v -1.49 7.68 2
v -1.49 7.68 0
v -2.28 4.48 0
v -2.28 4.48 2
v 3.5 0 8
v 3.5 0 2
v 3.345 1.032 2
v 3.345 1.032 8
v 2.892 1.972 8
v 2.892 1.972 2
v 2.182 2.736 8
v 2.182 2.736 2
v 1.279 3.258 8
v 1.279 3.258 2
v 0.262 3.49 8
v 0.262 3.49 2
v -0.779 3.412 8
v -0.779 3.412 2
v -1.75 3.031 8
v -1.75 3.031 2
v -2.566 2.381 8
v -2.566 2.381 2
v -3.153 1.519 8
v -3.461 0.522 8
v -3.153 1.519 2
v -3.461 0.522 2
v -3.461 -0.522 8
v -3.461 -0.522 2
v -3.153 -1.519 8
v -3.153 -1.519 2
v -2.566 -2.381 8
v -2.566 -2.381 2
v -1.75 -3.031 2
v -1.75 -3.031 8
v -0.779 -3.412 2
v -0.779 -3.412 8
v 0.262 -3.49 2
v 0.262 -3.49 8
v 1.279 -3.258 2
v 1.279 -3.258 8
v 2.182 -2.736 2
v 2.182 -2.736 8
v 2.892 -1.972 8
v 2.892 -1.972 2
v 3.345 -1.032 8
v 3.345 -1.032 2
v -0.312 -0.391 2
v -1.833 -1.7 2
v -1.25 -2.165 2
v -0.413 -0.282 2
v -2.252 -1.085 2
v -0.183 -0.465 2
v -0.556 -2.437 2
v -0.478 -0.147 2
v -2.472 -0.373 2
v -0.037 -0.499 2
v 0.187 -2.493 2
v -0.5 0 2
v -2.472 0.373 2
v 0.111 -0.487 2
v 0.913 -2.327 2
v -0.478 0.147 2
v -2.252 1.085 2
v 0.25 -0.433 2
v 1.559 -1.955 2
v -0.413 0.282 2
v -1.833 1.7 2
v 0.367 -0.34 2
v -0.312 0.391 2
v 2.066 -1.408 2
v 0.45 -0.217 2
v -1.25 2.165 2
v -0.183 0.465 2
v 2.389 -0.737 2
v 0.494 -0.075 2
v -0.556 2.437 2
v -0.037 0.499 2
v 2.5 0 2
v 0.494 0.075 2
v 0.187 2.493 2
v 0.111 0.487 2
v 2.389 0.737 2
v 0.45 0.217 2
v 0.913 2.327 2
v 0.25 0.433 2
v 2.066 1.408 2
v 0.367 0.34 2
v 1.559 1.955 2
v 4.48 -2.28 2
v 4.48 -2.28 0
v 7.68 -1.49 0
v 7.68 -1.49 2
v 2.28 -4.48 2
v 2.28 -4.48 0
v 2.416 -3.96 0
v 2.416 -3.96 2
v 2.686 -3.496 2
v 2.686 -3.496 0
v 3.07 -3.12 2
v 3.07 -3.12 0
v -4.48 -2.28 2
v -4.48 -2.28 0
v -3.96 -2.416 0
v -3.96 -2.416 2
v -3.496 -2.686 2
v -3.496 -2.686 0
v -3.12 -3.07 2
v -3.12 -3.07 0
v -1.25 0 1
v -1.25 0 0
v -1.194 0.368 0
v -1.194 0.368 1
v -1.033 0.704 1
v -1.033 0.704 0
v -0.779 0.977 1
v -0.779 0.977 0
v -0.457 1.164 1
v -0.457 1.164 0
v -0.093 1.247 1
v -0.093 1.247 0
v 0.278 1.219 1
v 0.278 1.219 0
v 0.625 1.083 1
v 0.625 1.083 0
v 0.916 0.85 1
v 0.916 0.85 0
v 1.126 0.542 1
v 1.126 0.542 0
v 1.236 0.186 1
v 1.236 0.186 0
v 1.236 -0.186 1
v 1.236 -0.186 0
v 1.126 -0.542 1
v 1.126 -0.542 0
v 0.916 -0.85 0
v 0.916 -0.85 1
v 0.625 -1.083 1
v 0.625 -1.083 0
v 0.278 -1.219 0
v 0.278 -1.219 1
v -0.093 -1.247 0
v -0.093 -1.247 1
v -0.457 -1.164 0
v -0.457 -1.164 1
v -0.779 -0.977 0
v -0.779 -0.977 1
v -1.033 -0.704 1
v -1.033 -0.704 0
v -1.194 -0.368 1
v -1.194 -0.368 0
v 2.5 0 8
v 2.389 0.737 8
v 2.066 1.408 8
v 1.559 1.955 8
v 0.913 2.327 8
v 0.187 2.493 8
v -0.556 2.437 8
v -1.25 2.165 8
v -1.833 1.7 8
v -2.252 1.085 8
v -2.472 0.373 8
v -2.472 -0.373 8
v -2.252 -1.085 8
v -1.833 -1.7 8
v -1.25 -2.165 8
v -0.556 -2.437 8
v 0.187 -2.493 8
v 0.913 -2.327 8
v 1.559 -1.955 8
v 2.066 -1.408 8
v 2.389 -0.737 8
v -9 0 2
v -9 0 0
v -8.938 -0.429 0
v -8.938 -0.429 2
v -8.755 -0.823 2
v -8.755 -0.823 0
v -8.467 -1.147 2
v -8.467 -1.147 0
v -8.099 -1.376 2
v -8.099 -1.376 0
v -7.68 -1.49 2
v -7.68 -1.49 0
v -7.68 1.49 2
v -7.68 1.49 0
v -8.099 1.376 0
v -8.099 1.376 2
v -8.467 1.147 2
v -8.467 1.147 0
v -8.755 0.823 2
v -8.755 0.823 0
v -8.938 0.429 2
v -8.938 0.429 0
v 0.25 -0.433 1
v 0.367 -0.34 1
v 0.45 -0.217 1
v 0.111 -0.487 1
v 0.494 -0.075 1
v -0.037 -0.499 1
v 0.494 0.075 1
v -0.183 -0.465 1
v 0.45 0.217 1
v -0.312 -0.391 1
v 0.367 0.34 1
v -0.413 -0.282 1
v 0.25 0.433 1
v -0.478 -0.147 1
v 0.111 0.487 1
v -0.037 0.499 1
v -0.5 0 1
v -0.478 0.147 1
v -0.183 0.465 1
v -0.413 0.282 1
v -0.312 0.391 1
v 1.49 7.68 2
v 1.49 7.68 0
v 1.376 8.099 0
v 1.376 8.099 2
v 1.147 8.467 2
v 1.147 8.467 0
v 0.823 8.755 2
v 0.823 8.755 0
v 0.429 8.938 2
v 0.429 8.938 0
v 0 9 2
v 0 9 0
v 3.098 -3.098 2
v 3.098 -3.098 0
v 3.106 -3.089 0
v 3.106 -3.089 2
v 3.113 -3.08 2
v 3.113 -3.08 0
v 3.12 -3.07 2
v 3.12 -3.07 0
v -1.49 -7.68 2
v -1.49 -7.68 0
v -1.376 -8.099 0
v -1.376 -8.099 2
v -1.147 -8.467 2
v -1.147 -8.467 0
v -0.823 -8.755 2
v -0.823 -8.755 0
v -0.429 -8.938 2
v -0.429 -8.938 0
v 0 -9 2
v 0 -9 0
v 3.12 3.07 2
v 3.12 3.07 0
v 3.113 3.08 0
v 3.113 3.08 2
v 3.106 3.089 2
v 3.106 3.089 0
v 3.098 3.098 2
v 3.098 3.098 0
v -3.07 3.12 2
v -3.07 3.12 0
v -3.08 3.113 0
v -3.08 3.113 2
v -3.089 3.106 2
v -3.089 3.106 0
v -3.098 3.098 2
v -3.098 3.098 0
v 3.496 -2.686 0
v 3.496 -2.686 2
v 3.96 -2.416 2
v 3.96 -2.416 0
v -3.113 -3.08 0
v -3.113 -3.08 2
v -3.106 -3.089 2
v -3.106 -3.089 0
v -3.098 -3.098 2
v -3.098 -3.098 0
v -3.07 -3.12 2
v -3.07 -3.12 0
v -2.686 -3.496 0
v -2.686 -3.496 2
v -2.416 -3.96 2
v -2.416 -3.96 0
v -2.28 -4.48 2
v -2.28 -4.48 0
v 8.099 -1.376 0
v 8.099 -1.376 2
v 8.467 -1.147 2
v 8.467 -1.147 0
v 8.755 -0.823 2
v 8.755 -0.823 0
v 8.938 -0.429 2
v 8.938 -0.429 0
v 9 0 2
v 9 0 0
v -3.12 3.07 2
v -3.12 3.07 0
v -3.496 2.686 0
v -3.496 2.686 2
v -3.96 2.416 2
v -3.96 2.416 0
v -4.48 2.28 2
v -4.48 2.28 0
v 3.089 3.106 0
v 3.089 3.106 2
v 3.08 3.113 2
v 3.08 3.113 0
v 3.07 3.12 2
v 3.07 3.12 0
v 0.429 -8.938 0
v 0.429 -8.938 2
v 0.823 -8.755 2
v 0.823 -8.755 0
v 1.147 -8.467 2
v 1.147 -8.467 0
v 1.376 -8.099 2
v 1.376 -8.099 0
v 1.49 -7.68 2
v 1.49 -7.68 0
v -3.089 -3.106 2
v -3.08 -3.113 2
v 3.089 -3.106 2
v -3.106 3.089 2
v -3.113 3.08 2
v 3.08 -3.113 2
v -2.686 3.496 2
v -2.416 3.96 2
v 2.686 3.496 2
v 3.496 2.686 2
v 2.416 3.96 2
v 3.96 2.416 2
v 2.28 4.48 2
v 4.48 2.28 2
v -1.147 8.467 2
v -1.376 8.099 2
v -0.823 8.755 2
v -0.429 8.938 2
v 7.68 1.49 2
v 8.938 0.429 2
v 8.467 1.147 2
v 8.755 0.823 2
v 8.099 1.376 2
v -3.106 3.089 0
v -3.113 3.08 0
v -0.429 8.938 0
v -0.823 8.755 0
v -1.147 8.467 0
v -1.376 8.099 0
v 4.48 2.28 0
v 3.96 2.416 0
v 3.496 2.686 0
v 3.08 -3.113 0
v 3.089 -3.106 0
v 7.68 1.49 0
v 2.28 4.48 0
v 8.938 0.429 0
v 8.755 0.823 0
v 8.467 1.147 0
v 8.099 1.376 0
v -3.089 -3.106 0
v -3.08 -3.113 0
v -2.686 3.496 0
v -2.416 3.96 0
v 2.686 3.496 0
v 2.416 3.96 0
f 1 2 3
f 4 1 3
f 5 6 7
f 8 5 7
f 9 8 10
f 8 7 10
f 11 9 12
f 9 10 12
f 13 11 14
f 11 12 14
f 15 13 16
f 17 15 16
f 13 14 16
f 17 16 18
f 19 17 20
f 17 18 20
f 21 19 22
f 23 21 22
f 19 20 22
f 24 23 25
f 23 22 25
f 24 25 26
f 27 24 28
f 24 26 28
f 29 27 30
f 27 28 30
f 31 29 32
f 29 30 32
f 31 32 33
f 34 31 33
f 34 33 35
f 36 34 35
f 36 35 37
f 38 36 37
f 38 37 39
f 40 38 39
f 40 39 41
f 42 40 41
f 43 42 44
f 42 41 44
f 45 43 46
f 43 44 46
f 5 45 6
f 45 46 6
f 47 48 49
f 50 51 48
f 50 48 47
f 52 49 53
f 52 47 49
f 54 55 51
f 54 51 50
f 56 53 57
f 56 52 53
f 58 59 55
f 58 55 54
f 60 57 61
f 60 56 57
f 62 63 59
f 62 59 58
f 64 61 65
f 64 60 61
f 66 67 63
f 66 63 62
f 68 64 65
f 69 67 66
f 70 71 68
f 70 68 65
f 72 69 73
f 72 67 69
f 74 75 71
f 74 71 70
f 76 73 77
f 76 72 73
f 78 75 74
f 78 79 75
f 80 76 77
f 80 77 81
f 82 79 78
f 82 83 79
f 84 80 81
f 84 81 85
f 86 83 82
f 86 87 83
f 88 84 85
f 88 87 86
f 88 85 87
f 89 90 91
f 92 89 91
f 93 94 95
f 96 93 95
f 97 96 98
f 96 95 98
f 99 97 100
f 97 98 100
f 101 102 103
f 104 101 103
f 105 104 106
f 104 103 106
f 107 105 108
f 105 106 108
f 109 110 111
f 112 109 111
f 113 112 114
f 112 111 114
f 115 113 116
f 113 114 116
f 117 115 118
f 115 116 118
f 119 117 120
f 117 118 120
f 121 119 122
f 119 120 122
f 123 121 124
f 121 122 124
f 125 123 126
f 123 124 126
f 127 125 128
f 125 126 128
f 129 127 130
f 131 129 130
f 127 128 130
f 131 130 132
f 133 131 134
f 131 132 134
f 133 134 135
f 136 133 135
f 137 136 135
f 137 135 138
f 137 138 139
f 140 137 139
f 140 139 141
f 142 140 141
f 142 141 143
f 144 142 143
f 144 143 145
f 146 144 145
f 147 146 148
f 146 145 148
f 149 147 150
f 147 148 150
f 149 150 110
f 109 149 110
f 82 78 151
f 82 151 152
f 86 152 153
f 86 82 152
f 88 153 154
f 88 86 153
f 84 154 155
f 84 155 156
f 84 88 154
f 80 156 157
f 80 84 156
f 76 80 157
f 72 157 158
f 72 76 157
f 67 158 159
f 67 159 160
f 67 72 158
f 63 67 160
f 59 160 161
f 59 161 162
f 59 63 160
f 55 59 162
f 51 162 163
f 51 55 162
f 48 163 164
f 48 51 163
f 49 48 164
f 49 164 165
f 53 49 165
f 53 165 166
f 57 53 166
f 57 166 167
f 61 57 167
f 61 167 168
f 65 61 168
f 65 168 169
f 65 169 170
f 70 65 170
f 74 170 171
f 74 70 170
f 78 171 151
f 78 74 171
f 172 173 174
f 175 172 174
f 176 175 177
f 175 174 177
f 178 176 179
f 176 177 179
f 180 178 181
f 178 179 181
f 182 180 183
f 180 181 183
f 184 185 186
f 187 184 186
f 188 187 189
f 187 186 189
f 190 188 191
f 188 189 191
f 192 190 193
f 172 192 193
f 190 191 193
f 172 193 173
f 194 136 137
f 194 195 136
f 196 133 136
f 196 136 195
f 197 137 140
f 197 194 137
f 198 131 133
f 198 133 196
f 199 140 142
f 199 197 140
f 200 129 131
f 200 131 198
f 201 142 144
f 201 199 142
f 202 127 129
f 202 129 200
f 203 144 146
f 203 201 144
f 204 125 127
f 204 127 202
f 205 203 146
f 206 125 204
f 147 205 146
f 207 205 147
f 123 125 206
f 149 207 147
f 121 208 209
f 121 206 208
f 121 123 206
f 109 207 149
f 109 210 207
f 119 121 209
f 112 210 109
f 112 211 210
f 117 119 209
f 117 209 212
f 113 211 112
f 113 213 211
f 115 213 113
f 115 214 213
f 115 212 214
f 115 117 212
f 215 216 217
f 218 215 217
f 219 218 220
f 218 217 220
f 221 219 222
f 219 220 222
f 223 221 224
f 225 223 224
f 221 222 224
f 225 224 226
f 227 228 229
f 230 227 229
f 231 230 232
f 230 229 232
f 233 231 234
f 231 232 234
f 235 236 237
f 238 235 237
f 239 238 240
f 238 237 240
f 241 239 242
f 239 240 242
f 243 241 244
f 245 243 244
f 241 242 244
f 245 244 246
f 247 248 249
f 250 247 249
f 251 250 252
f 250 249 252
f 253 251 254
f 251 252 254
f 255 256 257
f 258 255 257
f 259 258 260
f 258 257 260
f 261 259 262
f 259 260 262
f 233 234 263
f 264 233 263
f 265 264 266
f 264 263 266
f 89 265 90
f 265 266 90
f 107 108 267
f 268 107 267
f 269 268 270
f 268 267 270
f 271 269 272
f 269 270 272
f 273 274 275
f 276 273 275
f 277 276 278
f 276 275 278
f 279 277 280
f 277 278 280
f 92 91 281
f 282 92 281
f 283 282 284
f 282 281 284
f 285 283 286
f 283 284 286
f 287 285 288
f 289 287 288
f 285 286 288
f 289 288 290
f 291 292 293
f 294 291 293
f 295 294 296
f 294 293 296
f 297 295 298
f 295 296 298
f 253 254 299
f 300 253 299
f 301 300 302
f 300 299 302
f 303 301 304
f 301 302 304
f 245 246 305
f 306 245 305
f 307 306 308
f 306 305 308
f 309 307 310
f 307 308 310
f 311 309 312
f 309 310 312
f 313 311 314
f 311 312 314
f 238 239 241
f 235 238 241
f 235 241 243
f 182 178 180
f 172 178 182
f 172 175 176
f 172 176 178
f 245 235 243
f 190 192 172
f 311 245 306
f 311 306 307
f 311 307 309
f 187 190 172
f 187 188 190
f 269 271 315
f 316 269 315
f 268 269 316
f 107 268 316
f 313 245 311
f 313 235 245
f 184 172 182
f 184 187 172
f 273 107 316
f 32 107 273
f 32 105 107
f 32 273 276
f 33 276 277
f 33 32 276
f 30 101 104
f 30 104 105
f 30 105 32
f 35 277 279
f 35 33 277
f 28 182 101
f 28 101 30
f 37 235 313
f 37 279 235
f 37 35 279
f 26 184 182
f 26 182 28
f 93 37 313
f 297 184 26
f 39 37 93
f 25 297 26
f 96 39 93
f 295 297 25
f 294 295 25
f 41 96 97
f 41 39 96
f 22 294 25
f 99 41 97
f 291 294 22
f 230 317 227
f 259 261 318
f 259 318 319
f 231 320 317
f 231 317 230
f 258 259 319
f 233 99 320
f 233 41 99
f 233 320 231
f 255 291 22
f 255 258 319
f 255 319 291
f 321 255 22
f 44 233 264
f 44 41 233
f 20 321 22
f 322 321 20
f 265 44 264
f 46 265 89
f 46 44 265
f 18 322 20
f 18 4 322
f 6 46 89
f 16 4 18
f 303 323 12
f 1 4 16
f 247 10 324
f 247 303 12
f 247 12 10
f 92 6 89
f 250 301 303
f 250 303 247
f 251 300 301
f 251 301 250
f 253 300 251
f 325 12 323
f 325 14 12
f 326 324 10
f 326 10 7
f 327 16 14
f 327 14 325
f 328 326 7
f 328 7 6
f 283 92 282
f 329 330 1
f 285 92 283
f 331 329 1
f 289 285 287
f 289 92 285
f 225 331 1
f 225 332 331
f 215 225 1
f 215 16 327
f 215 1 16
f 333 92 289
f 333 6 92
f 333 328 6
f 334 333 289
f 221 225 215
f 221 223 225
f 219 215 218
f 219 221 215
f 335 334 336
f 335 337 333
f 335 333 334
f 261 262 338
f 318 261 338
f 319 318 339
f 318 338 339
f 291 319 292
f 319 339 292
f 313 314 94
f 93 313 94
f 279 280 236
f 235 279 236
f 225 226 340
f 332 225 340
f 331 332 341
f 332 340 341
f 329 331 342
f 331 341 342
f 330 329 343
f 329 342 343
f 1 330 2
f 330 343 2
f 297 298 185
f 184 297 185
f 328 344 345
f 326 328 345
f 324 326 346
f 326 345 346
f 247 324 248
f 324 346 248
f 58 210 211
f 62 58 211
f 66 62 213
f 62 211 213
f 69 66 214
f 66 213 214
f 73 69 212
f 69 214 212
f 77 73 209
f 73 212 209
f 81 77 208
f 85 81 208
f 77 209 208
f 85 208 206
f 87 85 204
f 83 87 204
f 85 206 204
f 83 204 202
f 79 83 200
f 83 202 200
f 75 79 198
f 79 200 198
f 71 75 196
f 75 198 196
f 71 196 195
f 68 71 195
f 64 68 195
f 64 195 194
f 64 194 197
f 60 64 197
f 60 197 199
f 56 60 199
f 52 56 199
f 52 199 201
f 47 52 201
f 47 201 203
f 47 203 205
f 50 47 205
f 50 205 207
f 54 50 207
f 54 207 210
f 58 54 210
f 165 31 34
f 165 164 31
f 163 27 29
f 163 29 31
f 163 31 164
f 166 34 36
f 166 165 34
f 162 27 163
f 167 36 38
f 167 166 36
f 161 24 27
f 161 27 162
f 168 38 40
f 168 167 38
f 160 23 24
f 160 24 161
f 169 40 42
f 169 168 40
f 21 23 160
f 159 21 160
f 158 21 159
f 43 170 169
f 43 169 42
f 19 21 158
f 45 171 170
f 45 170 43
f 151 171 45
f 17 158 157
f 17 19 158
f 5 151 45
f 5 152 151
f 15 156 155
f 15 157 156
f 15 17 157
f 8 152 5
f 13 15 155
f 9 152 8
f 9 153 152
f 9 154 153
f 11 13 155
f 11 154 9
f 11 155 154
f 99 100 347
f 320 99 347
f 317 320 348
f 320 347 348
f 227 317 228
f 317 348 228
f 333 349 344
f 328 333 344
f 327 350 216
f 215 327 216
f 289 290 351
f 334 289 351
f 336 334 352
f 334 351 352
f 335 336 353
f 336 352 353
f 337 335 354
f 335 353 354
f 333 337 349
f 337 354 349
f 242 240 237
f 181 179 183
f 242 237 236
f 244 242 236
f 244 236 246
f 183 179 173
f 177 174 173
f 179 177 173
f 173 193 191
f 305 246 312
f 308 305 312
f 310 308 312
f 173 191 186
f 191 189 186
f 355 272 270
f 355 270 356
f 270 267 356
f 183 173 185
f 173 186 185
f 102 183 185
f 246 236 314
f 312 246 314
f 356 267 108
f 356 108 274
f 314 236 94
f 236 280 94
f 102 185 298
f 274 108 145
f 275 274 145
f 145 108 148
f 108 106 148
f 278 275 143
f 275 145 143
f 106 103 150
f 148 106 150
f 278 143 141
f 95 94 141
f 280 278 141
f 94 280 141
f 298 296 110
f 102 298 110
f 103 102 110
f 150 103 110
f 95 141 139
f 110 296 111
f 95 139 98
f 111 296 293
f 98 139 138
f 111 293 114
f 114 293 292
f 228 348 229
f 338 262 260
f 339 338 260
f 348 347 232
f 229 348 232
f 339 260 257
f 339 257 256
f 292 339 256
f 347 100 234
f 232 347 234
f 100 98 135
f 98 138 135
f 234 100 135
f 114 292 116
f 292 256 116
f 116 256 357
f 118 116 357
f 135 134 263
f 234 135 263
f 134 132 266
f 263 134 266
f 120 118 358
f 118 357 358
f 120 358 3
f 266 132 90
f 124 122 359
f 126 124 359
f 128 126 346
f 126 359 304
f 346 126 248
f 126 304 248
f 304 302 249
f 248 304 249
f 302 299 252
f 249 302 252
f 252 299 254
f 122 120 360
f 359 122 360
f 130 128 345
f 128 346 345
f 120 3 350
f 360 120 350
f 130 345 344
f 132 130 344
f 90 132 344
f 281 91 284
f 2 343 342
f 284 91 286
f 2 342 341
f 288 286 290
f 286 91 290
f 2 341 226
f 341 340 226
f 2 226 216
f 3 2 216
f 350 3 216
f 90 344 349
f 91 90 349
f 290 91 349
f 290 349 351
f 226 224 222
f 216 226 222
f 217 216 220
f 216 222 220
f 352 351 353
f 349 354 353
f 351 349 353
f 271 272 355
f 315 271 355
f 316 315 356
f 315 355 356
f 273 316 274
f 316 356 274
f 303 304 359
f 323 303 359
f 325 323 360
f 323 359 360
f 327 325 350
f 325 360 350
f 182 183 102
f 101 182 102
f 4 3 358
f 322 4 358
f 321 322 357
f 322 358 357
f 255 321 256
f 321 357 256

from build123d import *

# Parameters (mm, degrees)
BOSS_EXTRUDE1_DEPTH = 2
SKETCH3_R           = 3.5
SKETCH3_R_2         = 2.5
BOSS_EXTRUDE2_DEPTH = 6
SKETCH4_R           = 1.25
CUT_EXTRUDE1_DEPTH  = 1
SKETCH5_R           = 0.5
CUT_EXTRUDE2_DEPTH  = 15.525839337


with BuildPart() as part:
    # Sketch2 → Boss-Extrude1 (new body)
    with BuildSketch(Plane.XY):
        with BuildLine():
            Line((1.49, -7.68), (2.28, -4.48))
            ThreePointArc((2.28, -4.48), (2.535701974, -3.719084235), (3.07, -3.12))
            ThreePointArc((3.07, -3.12), (3.084239628, -3.109259088), (3.098353652, -3.098353652))
            ThreePointArc((3.098353652, -3.098353652), (3.109259088, -3.084239628), (3.12, -3.07))
            ThreePointArc((3.12, -3.07), (3.719084235, -2.535701974), (4.48, -2.28))
            Line((4.48, -2.28), (7.68, -1.49))
            ThreePointArc((7.68, -1.49), (8.622775638, -0.995512646), (9, 0))
            ThreePointArc((9, 0), (8.622775638, 0.995512646), (7.68, 1.49))
            Line((7.68, 1.49), (4.48, 2.28))
            ThreePointArc((4.48, 2.28), (3.719084235, 2.535701974), (3.12, 3.07))
            ThreePointArc((3.12, 3.07), (3.109259088, 3.084239628), (3.098353652, 3.098353652))
            ThreePointArc((3.098353652, 3.098353652), (3.084239628, 3.109259088), (3.07, 3.12))
            ThreePointArc((3.07, 3.12), (2.535701974, 3.719084235), (2.28, 4.48))
            Line((2.28, 4.48), (1.49, 7.68))
            ThreePointArc((1.49, 7.68), (0.995512646, 8.622775638), (0, 9))
            ThreePointArc((0, 9), (-0.995512646, 8.622775638), (-1.49, 7.68))
            Line((-1.49, 7.68), (-2.28, 4.48))
            ThreePointArc((-2.28, 4.48), (-2.535701974, 3.719084235), (-3.07, 3.12))
            ThreePointArc((-3.07, 3.12), (-3.084239628, 3.109259088), (-3.098353652, 3.098353652))
            ThreePointArc((-3.098353652, 3.098353652), (-3.109259088, 3.084239628), (-3.12, 3.07))
            ThreePointArc((-3.12, 3.07), (-3.719084235, 2.535701974), (-4.48, 2.28))
            Line((-4.48, 2.28), (-7.68, 1.49))
            ThreePointArc((-7.68, 1.49), (-8.622775638, 0.995512646), (-9, 0))
            ThreePointArc((-9, 0), (-8.622775638, -0.995512646), (-7.68, -1.49))
            Line((-7.68, -1.49), (-4.48, -2.28))
            ThreePointArc((-4.48, -2.28), (-3.719084235, -2.535701974), (-3.12, -3.07))
            ThreePointArc((-3.12, -3.07), (-3.109259088, -3.084239628), (-3.098353652, -3.098353652))
            ThreePointArc((-3.098353652, -3.098353652), (-3.084239628, -3.109259088), (-3.07, -3.12))
            ThreePointArc((-3.07, -3.12), (-2.535701974, -3.719084235), (-2.28, -4.48))
            Line((-2.28, -4.48), (-1.49, -7.68))
            ThreePointArc((-1.49, -7.68), (-0.995512646, -8.622775638), (0, -9))
            ThreePointArc((0, -9), (0.995512646, -8.622775638), (1.49, -7.68))
        make_face()
    extrude(amount=BOSS_EXTRUDE1_DEPTH)

    # Sketch3 → Boss-Extrude2 (add)
    with BuildSketch(Plane.XY.offset(2)):
        Circle(SKETCH3_R)
        Circle(SKETCH3_R_2, mode=Mode.SUBTRACT)
    extrude(amount=BOSS_EXTRUDE2_DEPTH)

    # Sketch4 → Cut-Extrude1 (cut)
    with BuildSketch(Plane(origin=(0, 0, 0), x_dir=(-1, 0, 0), z_dir=(0, 0, -1))):
        Circle(SKETCH4_R)
    extrude(amount=-CUT_EXTRUDE1_DEPTH, mode=Mode.SUBTRACT)

    # Sketch5 → Cut-Extrude2 (cut, through all)
    with BuildSketch(Plane(origin=(0, 0, 1), x_dir=(-1, 0, 0), z_dir=(0, 0, -1))):
        Circle(SKETCH5_R)
    extrude(amount=-CUT_EXTRUDE2_DEPTH, mode=Mode.SUBTRACT)


solid = part.part
